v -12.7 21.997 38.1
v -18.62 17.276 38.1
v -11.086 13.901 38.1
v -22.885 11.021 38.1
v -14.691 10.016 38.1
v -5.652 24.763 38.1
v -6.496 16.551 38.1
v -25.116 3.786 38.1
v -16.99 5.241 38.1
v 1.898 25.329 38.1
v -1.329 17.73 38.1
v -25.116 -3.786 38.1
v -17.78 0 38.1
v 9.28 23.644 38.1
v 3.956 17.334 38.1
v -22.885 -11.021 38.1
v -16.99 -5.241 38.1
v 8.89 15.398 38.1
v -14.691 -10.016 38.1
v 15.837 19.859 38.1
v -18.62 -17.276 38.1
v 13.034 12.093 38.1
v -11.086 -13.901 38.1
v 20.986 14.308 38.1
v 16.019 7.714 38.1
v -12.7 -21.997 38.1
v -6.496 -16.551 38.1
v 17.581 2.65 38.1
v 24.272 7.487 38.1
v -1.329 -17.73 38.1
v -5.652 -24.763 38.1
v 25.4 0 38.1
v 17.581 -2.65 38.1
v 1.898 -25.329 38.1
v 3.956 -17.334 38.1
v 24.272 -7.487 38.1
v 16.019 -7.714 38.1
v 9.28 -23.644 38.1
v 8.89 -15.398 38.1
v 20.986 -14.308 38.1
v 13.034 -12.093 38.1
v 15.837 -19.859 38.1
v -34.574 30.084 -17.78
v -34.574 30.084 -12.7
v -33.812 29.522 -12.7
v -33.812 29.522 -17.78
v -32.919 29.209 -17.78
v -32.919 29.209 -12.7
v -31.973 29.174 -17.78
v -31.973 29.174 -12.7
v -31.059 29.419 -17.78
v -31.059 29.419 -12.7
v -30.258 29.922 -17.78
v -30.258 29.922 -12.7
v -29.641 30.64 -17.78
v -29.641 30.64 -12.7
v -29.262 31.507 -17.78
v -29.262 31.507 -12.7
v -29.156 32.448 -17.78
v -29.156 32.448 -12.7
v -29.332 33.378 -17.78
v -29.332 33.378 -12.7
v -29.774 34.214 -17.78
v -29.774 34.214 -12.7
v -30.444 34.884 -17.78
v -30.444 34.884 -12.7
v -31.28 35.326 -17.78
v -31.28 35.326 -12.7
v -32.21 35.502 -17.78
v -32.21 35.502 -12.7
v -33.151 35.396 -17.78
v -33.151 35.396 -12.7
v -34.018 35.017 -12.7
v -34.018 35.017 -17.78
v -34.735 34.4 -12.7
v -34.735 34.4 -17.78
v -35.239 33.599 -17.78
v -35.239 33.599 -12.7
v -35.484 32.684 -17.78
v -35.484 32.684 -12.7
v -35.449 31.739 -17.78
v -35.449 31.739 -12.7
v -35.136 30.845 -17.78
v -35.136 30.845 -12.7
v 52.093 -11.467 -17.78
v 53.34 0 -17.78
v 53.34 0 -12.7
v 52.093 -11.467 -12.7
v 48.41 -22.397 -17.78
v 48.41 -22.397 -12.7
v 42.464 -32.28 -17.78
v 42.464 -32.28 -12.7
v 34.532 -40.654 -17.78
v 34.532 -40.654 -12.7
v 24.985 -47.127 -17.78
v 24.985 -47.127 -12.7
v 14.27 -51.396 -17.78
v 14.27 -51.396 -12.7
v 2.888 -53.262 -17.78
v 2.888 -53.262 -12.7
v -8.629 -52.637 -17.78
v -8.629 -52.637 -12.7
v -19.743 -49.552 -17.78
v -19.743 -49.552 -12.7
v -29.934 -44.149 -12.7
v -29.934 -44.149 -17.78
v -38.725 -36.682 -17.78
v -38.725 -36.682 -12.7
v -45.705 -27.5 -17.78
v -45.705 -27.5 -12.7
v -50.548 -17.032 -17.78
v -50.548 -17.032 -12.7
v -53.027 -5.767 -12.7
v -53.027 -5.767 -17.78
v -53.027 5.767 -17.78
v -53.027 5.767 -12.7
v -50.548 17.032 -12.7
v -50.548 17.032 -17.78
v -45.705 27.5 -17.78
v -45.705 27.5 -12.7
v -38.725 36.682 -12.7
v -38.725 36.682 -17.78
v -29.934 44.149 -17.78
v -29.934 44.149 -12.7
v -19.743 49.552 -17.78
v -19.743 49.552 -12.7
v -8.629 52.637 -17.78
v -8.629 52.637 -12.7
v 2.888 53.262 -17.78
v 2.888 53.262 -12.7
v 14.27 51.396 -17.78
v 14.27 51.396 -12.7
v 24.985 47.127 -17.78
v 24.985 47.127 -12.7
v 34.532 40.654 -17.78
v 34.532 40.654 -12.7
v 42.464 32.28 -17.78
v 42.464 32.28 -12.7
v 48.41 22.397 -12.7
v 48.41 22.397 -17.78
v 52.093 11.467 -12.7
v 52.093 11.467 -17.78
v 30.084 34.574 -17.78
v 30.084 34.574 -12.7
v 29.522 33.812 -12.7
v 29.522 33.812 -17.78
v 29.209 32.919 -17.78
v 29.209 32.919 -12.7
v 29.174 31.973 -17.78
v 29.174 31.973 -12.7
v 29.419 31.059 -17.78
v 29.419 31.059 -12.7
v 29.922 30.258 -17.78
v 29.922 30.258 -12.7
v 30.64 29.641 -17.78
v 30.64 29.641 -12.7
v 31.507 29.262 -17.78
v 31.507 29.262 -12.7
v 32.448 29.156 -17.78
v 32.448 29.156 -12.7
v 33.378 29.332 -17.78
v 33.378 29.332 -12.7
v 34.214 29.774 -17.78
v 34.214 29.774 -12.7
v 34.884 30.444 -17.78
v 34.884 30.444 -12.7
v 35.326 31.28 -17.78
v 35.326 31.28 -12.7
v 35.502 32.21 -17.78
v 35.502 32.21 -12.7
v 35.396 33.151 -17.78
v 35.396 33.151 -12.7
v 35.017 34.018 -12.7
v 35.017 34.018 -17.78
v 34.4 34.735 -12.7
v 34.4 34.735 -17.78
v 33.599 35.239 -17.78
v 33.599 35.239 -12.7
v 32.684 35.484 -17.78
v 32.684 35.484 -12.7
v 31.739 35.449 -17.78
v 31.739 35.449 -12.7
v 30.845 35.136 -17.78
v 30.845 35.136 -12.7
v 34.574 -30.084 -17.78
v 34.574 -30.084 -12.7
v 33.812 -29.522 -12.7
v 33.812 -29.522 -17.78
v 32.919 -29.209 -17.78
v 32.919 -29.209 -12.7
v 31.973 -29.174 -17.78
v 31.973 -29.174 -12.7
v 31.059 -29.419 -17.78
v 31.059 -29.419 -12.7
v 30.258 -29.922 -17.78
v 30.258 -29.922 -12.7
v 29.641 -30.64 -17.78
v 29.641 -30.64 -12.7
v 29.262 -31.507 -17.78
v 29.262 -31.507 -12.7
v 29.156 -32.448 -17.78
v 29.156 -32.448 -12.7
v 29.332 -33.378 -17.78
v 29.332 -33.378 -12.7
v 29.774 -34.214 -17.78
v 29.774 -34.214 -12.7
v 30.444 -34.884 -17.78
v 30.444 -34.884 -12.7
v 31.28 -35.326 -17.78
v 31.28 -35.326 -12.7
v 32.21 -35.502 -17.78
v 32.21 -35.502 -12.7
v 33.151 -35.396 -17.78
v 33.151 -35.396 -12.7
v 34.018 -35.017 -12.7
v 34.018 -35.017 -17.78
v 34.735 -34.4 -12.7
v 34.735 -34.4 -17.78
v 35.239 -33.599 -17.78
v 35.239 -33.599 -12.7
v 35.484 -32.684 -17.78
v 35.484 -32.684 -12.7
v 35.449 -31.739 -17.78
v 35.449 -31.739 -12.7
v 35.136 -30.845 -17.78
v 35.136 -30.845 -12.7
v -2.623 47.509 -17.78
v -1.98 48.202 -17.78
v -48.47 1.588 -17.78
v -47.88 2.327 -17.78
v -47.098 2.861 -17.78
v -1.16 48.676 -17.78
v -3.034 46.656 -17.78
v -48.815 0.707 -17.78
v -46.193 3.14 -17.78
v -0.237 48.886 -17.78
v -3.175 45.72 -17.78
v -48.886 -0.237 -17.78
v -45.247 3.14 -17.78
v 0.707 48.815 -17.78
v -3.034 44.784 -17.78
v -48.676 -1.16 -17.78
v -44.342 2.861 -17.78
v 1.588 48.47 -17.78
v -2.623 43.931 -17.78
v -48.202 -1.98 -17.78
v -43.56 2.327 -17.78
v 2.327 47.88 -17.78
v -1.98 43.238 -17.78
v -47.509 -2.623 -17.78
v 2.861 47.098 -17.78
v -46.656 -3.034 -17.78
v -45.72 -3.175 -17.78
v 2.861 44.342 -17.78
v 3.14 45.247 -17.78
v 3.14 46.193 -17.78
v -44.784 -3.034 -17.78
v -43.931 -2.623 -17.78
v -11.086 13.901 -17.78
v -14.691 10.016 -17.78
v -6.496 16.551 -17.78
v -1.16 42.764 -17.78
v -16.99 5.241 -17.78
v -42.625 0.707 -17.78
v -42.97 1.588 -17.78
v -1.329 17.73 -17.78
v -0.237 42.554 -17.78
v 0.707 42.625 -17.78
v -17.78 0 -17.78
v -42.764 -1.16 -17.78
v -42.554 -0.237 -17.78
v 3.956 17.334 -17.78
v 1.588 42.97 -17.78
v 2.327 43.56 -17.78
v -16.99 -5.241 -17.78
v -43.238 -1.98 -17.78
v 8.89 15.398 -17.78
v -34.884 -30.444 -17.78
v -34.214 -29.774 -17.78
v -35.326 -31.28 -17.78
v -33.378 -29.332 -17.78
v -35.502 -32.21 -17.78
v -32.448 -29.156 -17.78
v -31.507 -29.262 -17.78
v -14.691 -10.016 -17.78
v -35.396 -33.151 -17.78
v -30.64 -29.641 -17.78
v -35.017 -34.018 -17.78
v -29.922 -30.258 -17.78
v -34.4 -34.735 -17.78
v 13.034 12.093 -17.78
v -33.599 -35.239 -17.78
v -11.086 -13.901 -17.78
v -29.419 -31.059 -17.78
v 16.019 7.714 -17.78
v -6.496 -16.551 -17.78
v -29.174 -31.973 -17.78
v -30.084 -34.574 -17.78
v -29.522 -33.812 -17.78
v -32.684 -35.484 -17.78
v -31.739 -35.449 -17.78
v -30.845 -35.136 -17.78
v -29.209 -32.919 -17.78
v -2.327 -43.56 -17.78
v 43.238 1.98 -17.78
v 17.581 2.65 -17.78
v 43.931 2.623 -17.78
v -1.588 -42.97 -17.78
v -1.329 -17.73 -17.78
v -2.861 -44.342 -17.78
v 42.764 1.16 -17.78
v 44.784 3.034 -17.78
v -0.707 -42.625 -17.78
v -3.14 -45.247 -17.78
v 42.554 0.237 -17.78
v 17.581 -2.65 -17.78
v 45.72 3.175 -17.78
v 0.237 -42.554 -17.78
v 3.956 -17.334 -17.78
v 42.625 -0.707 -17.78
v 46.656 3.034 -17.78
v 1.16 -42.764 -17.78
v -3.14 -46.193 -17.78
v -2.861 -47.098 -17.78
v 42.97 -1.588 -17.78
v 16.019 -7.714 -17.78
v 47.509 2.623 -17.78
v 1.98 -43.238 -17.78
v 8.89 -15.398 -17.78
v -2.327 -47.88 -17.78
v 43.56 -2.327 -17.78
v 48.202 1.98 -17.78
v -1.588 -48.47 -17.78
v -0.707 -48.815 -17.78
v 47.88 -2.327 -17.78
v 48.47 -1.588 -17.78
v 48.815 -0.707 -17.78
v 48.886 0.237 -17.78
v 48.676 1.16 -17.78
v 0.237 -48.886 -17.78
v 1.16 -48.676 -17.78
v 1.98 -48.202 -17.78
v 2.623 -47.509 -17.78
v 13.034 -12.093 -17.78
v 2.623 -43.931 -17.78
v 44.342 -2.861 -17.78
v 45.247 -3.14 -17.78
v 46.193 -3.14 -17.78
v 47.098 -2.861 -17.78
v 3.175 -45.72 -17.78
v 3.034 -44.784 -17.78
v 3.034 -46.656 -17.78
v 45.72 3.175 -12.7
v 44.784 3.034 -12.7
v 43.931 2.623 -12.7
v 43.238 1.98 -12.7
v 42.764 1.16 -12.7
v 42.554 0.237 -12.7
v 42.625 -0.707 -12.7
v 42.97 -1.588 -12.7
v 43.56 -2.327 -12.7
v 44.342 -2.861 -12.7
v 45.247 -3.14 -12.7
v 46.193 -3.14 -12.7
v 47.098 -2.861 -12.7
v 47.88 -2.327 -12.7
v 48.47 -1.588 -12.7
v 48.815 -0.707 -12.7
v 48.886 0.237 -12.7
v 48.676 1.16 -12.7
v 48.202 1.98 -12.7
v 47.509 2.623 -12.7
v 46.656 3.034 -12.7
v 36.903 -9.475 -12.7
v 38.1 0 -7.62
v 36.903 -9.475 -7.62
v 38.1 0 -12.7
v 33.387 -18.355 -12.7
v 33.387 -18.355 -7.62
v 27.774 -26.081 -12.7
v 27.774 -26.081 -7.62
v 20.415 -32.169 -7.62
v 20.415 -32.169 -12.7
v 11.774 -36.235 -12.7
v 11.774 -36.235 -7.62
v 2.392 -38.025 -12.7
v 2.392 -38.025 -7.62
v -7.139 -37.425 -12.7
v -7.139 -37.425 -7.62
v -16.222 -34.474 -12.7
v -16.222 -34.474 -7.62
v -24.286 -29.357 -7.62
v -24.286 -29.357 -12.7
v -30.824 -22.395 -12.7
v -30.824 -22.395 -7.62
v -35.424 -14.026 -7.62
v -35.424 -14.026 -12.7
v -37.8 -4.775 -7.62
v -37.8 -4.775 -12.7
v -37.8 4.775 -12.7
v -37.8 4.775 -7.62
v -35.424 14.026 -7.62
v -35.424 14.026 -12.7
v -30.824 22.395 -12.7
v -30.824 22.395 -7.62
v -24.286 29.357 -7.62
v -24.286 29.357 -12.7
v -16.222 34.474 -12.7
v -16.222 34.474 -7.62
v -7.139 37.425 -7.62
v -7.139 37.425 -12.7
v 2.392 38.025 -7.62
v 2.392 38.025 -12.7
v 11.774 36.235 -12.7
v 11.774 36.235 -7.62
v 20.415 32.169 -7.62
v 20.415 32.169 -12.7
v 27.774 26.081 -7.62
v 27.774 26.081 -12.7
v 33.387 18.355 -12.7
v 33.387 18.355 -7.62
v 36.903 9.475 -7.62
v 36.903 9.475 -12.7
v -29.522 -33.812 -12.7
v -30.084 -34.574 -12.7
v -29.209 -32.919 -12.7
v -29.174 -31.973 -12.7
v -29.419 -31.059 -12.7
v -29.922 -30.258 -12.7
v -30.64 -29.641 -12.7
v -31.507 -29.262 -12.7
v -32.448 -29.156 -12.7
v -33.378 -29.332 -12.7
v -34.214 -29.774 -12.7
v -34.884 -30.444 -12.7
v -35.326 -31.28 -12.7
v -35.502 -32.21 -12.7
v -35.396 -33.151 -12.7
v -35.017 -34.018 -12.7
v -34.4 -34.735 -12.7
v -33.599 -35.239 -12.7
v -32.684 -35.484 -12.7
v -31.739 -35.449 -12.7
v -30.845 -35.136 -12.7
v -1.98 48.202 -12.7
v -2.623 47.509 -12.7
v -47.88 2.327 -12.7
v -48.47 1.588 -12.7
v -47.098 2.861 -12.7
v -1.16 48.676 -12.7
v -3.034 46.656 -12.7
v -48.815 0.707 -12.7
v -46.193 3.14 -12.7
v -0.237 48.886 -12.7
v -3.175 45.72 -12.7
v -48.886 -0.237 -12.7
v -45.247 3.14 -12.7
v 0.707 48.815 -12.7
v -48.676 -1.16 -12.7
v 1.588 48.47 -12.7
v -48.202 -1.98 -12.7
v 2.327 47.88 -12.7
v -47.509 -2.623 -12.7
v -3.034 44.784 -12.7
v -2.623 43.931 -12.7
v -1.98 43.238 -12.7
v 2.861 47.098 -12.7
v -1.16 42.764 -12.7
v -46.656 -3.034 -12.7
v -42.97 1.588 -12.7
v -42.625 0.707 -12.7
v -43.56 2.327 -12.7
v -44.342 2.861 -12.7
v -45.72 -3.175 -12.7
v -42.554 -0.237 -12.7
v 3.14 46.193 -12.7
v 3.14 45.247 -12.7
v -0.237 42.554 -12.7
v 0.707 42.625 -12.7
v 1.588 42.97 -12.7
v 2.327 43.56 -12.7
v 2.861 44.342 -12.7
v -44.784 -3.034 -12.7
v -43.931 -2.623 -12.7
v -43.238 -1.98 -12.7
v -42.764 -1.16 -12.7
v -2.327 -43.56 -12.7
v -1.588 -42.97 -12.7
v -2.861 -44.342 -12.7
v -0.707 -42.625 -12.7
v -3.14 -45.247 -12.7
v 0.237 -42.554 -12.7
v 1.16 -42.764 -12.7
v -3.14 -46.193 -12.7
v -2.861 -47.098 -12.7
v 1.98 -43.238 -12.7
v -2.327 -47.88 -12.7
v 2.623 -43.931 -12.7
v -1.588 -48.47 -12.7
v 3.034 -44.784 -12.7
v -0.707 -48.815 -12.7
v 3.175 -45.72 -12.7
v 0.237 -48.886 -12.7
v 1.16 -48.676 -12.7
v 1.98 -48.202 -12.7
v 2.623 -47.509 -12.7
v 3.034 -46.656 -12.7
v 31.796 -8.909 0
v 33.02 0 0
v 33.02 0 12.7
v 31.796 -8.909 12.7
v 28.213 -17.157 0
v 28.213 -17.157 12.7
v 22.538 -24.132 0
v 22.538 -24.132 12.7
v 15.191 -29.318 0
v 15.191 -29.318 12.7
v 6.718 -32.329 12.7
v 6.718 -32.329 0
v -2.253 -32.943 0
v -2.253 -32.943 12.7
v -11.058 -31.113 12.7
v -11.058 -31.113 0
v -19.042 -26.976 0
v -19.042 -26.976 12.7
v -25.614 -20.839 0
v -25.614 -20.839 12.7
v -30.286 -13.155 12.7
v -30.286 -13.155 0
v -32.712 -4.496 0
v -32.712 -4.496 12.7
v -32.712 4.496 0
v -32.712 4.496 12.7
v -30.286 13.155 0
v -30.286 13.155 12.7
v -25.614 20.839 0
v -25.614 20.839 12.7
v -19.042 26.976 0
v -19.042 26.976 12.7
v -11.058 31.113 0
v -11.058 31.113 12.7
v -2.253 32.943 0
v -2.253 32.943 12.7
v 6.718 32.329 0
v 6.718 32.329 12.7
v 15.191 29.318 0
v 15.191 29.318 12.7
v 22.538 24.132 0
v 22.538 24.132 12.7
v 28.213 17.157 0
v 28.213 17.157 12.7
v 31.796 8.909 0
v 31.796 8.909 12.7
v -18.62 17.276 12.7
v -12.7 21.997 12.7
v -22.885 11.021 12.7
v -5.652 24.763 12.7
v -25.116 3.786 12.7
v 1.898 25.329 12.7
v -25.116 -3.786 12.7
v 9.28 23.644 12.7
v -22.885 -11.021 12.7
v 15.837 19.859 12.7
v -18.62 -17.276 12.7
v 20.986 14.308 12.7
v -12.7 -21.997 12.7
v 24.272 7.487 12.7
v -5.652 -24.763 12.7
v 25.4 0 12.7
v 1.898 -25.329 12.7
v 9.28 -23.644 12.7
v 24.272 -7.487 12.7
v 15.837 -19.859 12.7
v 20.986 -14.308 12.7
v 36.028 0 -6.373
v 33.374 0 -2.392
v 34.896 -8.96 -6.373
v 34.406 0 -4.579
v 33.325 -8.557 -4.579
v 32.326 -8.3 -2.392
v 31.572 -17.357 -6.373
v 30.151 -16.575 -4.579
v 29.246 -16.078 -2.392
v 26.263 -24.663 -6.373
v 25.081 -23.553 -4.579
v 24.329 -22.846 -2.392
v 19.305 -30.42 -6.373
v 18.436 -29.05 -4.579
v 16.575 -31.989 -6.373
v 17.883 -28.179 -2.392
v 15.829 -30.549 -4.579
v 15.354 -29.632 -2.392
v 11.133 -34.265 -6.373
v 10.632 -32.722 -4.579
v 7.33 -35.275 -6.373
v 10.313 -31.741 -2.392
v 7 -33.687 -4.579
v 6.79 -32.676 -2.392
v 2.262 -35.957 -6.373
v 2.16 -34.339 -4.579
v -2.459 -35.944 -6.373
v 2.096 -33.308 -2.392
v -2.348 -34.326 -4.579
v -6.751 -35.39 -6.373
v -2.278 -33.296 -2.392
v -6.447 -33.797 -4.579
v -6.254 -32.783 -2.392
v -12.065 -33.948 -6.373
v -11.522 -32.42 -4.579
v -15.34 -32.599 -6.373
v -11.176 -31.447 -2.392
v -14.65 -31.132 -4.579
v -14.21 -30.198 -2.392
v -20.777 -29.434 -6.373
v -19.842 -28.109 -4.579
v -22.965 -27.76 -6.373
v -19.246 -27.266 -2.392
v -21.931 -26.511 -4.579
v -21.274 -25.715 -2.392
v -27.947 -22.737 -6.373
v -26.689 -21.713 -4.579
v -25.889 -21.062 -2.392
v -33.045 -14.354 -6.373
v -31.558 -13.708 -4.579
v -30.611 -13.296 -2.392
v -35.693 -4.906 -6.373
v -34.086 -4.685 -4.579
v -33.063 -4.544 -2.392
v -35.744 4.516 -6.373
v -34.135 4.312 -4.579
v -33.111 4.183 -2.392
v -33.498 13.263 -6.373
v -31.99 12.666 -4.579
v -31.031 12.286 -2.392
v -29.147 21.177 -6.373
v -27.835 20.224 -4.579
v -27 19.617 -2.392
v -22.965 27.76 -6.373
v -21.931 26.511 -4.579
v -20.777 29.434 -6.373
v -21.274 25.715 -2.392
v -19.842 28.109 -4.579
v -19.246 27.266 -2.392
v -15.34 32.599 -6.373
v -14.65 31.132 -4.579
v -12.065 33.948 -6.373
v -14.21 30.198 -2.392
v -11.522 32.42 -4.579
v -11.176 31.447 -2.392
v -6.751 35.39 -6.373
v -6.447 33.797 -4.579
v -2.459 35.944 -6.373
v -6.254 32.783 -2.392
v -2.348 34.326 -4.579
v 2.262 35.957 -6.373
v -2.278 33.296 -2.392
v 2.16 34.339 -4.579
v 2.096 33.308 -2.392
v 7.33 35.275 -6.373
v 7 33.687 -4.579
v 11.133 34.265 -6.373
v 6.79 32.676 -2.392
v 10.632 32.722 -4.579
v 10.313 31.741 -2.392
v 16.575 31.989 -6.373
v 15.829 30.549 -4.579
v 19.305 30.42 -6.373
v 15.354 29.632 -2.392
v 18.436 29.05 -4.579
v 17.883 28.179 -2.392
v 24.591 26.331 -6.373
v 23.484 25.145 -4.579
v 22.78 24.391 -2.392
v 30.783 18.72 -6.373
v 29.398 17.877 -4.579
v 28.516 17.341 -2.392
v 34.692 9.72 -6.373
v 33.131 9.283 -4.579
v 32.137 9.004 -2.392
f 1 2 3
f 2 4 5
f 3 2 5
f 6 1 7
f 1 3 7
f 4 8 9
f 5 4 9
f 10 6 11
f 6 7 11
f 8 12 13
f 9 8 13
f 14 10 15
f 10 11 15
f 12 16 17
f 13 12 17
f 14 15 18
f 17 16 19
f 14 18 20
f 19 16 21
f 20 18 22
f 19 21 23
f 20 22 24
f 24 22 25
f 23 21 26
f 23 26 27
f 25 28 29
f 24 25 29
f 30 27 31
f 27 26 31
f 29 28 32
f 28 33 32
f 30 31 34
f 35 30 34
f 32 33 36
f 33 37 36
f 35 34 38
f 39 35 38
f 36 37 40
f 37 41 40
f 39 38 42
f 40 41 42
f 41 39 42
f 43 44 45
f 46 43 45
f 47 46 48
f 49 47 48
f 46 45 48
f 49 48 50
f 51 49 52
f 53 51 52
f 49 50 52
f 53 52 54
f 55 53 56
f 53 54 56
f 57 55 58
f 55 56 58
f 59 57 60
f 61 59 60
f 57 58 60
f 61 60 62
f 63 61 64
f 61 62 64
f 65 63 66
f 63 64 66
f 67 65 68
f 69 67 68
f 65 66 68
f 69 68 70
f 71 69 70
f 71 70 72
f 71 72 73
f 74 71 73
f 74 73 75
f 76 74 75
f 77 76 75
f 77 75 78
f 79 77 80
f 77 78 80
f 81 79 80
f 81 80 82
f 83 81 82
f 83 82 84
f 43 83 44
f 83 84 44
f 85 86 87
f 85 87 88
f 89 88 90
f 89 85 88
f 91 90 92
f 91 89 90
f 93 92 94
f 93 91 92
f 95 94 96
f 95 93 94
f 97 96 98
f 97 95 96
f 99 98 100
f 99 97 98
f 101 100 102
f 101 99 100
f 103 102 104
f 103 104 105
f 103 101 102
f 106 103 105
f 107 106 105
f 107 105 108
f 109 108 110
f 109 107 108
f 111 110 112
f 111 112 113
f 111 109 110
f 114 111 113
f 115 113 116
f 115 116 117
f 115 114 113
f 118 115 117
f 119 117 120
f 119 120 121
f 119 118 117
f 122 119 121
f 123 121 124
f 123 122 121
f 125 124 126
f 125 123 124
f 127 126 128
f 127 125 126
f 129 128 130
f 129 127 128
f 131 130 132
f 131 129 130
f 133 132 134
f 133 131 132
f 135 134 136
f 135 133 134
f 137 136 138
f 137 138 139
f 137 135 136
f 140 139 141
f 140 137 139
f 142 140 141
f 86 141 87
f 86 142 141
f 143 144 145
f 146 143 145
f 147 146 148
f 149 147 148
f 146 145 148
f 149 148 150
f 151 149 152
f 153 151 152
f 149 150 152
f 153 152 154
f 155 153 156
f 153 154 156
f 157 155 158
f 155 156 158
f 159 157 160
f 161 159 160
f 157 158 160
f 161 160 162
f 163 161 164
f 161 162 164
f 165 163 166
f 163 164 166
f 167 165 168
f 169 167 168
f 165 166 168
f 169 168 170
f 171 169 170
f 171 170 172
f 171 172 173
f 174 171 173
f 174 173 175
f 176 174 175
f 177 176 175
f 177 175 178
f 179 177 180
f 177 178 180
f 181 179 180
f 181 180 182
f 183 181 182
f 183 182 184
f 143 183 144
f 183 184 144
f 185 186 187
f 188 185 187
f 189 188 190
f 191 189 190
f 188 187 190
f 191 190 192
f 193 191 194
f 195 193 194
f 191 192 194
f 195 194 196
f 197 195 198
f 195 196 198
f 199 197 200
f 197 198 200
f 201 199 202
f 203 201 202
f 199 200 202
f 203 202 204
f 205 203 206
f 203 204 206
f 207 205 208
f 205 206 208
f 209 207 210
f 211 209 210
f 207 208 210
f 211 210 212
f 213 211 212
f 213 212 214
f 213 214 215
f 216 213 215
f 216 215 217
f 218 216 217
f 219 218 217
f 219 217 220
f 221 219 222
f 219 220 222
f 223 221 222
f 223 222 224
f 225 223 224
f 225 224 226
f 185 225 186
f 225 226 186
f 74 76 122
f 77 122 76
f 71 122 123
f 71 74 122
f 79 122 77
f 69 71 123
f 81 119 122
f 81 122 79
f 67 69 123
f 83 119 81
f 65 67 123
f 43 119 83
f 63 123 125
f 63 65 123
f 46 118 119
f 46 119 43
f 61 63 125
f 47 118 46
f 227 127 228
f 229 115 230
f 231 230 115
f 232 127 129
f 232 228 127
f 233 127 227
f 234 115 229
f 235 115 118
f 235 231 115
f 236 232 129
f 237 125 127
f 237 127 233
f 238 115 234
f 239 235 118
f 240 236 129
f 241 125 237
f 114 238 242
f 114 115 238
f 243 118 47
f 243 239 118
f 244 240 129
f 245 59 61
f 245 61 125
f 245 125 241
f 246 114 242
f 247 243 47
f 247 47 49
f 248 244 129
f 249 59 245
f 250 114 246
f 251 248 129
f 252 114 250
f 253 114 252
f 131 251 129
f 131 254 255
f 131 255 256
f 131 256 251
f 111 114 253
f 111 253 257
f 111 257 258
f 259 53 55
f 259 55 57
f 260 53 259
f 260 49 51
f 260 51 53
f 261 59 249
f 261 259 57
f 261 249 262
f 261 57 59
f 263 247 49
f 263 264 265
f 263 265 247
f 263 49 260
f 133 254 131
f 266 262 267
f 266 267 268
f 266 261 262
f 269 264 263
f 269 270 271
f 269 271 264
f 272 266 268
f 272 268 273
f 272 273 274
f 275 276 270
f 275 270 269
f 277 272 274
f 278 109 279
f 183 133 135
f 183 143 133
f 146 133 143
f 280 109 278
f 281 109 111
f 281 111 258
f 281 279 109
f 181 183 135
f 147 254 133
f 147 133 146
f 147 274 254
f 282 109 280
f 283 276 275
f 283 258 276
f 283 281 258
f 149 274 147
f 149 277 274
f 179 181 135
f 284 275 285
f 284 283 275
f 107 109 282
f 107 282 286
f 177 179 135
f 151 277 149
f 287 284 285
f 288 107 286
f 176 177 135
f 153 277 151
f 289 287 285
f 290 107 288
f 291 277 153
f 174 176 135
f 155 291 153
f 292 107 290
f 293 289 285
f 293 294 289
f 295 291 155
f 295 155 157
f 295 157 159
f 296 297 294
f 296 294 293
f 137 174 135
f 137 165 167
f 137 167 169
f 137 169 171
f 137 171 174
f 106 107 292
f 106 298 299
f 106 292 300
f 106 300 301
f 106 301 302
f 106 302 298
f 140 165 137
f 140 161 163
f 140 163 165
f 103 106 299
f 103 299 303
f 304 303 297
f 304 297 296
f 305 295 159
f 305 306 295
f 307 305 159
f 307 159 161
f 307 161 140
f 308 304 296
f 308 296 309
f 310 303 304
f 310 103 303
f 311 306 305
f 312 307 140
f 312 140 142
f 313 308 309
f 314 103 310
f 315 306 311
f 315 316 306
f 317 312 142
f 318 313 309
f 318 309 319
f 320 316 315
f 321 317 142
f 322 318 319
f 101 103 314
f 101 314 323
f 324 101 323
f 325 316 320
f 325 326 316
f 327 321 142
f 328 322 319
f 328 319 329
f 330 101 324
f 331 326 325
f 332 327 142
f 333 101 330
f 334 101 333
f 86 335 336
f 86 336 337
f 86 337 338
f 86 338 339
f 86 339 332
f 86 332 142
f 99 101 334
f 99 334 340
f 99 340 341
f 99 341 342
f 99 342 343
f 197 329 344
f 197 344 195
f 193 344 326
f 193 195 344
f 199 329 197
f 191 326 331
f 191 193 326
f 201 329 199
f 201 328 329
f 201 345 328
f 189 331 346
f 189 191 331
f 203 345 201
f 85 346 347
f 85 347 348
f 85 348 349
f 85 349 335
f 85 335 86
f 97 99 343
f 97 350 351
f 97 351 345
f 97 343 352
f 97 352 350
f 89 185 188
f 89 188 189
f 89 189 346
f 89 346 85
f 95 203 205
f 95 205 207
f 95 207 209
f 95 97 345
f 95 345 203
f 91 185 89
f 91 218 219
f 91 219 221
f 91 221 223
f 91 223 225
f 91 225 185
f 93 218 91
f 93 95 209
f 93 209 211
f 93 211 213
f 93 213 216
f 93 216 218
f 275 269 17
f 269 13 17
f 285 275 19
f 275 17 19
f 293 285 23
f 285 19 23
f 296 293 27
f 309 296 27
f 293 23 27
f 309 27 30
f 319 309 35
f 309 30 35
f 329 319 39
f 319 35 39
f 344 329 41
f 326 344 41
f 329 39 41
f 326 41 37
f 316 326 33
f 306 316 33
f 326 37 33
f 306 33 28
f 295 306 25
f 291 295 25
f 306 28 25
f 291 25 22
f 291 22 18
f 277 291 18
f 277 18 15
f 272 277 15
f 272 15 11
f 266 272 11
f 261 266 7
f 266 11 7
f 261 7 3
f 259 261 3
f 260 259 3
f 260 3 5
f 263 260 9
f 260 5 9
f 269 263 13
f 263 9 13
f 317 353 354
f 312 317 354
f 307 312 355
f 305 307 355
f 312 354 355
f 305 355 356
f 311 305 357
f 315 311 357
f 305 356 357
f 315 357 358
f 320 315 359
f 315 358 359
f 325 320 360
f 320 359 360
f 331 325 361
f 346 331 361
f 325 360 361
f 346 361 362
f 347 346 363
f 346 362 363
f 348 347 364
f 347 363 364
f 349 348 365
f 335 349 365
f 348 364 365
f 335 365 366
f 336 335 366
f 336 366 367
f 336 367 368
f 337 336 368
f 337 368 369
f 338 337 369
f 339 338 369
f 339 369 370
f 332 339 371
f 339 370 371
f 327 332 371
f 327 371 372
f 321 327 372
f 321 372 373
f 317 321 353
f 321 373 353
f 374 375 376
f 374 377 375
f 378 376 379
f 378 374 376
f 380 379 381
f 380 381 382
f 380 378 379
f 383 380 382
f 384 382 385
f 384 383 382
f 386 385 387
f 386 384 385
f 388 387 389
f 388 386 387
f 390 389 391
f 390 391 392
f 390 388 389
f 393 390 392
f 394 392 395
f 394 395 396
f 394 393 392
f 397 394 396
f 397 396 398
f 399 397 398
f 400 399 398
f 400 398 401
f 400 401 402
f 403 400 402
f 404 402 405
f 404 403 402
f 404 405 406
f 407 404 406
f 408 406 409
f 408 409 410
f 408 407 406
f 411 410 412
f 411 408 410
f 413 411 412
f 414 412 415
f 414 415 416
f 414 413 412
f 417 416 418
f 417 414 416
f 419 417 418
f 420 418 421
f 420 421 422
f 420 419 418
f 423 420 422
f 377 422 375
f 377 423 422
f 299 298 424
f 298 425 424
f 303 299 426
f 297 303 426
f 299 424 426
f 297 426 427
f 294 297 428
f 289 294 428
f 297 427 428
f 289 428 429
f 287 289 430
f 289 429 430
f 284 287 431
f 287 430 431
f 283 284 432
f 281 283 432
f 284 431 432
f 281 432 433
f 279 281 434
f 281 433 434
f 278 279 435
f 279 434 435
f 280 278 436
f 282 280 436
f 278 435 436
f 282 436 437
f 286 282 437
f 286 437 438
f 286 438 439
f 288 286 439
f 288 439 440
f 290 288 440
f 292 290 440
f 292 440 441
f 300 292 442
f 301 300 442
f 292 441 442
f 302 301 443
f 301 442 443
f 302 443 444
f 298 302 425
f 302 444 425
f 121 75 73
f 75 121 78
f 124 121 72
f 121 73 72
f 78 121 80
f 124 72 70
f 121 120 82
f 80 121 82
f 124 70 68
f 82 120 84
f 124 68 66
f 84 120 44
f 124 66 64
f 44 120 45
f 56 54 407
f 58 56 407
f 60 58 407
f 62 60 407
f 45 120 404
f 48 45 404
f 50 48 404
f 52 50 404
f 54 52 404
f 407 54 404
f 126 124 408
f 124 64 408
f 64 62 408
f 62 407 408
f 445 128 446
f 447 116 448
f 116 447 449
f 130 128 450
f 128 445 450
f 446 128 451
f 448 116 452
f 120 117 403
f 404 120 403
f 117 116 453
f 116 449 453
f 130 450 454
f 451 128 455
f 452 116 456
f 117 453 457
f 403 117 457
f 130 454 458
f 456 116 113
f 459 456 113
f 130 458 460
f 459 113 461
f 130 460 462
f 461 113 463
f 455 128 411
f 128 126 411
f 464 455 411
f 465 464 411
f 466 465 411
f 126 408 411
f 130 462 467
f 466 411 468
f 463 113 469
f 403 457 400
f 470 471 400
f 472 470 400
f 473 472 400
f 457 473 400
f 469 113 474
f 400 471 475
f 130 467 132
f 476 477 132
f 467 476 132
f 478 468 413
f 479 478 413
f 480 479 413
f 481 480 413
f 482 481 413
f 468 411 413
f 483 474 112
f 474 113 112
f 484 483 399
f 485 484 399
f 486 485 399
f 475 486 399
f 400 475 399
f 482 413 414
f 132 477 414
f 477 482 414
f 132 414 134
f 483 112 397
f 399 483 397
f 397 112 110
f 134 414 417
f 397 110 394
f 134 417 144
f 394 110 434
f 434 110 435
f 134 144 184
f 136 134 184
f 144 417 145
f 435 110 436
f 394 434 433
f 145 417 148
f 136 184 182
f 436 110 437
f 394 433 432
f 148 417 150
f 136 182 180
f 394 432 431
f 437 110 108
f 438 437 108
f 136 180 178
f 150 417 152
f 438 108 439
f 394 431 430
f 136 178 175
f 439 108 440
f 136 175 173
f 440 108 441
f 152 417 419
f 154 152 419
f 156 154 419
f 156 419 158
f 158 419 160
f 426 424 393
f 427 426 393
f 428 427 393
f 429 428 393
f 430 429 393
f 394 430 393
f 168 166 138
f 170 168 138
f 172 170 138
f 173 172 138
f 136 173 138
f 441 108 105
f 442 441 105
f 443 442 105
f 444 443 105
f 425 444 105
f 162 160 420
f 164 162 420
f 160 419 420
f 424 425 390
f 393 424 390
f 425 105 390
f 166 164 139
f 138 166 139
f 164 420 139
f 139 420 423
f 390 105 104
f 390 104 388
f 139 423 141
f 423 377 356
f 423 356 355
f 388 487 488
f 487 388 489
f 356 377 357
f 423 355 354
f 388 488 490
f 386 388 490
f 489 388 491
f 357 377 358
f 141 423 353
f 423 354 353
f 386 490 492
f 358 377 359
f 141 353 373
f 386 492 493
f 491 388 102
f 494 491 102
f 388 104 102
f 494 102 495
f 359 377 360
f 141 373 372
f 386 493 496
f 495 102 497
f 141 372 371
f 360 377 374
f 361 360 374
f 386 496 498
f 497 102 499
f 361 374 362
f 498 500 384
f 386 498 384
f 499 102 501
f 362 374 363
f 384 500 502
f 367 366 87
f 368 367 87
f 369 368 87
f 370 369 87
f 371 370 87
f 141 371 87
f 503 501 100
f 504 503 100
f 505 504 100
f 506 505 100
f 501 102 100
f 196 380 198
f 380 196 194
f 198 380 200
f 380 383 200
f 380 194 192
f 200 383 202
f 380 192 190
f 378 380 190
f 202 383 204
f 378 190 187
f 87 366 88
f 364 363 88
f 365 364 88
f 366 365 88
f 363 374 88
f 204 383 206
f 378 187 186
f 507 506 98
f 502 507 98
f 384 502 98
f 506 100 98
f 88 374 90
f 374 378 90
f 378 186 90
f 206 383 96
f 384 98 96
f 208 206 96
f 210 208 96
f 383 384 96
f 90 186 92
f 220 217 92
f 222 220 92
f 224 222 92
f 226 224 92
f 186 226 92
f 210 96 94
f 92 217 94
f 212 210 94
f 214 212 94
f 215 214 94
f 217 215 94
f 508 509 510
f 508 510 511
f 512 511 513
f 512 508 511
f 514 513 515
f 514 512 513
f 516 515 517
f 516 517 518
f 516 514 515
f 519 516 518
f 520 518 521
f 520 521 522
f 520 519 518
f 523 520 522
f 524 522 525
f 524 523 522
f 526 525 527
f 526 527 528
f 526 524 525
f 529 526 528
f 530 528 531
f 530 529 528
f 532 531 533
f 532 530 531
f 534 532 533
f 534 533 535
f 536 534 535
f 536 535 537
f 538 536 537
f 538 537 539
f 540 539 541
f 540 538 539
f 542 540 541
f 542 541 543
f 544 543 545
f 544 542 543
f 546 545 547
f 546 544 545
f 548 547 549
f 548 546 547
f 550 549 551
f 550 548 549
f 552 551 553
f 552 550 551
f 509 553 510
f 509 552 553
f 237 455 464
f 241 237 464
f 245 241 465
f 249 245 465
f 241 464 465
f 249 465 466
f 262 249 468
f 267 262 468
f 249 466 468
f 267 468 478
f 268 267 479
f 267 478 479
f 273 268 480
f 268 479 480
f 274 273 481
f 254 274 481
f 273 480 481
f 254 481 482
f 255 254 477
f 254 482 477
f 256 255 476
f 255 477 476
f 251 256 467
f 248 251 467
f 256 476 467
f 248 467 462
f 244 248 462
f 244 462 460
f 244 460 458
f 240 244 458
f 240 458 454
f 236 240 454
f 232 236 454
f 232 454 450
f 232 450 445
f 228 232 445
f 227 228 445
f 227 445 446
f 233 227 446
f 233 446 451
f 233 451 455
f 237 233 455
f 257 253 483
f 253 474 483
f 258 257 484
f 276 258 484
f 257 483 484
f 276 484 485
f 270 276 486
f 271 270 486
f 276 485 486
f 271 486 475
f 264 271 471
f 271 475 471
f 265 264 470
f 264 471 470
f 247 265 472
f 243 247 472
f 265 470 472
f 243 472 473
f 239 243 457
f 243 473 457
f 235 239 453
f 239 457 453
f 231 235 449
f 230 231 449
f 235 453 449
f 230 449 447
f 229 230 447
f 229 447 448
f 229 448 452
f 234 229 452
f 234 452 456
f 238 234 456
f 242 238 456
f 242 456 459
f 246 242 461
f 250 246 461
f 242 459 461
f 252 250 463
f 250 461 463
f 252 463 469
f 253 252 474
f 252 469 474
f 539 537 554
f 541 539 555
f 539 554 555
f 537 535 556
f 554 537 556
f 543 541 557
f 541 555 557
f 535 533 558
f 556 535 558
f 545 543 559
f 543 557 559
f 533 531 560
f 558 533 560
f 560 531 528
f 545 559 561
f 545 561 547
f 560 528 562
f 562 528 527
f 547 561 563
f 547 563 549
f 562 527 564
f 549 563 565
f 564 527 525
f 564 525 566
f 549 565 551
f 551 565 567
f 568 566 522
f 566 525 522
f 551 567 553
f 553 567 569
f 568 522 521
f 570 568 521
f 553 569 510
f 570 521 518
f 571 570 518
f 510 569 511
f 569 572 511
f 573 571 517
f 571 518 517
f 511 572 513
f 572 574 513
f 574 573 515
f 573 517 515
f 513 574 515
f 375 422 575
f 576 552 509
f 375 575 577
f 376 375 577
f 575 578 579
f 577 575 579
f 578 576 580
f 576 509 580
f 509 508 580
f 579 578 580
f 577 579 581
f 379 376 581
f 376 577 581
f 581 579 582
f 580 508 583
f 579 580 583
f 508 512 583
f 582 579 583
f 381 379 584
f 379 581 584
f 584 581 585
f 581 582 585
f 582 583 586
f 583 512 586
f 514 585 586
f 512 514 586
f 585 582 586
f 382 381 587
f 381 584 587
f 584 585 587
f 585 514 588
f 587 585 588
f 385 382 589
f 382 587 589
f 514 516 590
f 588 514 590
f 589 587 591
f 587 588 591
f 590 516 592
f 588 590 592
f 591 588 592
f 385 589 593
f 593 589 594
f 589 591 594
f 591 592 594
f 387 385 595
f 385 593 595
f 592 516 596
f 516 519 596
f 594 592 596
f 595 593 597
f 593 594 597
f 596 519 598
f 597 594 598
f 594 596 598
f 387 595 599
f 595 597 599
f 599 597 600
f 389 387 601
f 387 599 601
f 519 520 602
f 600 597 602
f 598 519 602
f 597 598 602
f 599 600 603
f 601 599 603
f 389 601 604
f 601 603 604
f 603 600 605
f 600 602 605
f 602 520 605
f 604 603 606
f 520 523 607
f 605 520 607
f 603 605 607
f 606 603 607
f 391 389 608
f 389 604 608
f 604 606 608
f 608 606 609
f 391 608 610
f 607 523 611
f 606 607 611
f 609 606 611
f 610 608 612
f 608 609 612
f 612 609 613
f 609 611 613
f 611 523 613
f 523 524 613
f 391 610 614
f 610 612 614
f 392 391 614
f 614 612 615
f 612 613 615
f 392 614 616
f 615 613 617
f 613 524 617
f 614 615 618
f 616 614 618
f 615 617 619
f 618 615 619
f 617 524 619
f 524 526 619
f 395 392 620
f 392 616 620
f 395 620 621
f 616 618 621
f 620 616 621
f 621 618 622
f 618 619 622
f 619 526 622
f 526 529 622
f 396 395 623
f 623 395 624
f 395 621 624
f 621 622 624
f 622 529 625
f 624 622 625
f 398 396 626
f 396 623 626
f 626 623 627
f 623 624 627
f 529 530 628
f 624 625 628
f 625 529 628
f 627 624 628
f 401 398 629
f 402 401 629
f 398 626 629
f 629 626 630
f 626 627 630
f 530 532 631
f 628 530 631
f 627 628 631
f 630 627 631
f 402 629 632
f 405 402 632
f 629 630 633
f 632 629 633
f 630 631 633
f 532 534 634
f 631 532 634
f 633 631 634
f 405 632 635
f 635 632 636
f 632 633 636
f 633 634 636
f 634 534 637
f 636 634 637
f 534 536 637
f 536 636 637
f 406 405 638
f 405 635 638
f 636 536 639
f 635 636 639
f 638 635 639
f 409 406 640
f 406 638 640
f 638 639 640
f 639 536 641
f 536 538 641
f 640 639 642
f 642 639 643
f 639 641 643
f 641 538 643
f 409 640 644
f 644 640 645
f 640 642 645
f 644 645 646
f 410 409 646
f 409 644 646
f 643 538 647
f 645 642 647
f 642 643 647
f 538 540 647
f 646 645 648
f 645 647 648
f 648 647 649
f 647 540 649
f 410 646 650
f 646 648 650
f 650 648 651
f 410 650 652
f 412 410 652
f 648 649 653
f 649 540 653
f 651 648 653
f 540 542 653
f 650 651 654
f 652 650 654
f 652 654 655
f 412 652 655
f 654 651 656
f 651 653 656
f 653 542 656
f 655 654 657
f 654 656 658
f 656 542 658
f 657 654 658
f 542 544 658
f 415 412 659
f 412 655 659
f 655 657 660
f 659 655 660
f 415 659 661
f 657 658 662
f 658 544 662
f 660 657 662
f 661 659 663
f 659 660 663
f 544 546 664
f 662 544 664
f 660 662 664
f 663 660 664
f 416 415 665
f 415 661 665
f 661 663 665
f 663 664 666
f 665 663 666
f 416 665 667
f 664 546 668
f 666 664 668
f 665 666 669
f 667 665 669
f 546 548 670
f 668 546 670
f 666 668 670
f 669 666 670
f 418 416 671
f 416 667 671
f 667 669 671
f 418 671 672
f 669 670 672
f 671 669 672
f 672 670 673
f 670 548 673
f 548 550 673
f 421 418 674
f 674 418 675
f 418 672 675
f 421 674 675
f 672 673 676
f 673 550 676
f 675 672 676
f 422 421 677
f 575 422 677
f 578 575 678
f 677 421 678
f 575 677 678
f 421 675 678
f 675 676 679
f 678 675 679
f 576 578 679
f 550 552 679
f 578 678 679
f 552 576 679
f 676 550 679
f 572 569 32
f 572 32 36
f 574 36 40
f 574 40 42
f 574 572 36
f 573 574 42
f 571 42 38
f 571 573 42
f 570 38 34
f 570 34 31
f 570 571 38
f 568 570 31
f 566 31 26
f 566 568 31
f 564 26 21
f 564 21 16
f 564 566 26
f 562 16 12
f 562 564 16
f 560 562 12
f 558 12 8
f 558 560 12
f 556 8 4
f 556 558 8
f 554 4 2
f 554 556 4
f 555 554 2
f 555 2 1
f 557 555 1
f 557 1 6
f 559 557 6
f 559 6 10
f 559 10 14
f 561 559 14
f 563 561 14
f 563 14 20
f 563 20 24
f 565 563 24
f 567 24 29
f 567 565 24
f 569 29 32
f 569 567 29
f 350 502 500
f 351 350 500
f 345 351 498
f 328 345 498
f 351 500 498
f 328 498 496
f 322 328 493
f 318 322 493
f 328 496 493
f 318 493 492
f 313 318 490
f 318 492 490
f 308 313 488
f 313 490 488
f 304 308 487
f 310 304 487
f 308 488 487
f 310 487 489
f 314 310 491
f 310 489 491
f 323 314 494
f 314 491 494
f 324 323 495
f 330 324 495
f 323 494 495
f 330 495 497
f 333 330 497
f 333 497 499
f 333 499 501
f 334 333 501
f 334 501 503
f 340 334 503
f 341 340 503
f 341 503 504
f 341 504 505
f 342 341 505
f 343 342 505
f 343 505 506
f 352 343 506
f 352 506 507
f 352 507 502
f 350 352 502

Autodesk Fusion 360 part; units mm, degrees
sketch "Sketch1" plane through (0, 0, 0) normal (0, 1, 0) x (1, 0, 0)
  line L0 (25.4, -38.1) -> (25.4, -12.7)
  line L1 (25.4, -12.7) -> (33.02, -12.7)
  line L2 (33.02, -12.7) -> (33.02, 0)
  arc A0 (38.1, 7.62) -> (33.02, 0) centre (41.275, 0) ccw
  line L3 (38.1, 7.62) -> (38.1, 12.7)
  line L4 (25.4, -38.1) -> (0, -38.1)
  line L5 (38.1, 12.7) -> (53.34, 12.7)
  line L6 (53.34, 12.7) -> (53.34, 17.78)
  line L7 (53.34, 17.78) -> (0, 17.78)
  line L8 (0, -38.1) -> (0, 17.78)
revolve "Revolve1" add sketch "Sketch1" angle 360 about axis through (0, 0, 38.1) along (0, 0, -1)
sketch "Sketch2" plane through (0, 0, -12.7) normal (0, 0, 1) x (-1, 0, 0)
  circle A0 centre (0, 0) radius 53.34
  circle A1 centre (0, 0) radius 38.1
  circle A2 centre (0, -45.72) radius 3.175
  dimension "d2" = 6.35
extrude "Extrude1" cut sketch "Sketch2" against normal up to surface (5.08 mm away) contours A2
pattern_circular "C-Pattern1" count 8 over 360 about axis through (0, 0, 1.75) along (0, 0, 1) of "Extrude1"
sketch "Sketch3" plane through (0, 0, 38.1) normal (0, 0, 1) x (-1, 0, 0)
  circle A0 centre (0, 0) radius 25.4
  circle A1 centre (0, 0) radius 17.78
extrude "Extrude2" cut sketch "Sketch3" against normal up to surface (55.88 mm away) contours A1
